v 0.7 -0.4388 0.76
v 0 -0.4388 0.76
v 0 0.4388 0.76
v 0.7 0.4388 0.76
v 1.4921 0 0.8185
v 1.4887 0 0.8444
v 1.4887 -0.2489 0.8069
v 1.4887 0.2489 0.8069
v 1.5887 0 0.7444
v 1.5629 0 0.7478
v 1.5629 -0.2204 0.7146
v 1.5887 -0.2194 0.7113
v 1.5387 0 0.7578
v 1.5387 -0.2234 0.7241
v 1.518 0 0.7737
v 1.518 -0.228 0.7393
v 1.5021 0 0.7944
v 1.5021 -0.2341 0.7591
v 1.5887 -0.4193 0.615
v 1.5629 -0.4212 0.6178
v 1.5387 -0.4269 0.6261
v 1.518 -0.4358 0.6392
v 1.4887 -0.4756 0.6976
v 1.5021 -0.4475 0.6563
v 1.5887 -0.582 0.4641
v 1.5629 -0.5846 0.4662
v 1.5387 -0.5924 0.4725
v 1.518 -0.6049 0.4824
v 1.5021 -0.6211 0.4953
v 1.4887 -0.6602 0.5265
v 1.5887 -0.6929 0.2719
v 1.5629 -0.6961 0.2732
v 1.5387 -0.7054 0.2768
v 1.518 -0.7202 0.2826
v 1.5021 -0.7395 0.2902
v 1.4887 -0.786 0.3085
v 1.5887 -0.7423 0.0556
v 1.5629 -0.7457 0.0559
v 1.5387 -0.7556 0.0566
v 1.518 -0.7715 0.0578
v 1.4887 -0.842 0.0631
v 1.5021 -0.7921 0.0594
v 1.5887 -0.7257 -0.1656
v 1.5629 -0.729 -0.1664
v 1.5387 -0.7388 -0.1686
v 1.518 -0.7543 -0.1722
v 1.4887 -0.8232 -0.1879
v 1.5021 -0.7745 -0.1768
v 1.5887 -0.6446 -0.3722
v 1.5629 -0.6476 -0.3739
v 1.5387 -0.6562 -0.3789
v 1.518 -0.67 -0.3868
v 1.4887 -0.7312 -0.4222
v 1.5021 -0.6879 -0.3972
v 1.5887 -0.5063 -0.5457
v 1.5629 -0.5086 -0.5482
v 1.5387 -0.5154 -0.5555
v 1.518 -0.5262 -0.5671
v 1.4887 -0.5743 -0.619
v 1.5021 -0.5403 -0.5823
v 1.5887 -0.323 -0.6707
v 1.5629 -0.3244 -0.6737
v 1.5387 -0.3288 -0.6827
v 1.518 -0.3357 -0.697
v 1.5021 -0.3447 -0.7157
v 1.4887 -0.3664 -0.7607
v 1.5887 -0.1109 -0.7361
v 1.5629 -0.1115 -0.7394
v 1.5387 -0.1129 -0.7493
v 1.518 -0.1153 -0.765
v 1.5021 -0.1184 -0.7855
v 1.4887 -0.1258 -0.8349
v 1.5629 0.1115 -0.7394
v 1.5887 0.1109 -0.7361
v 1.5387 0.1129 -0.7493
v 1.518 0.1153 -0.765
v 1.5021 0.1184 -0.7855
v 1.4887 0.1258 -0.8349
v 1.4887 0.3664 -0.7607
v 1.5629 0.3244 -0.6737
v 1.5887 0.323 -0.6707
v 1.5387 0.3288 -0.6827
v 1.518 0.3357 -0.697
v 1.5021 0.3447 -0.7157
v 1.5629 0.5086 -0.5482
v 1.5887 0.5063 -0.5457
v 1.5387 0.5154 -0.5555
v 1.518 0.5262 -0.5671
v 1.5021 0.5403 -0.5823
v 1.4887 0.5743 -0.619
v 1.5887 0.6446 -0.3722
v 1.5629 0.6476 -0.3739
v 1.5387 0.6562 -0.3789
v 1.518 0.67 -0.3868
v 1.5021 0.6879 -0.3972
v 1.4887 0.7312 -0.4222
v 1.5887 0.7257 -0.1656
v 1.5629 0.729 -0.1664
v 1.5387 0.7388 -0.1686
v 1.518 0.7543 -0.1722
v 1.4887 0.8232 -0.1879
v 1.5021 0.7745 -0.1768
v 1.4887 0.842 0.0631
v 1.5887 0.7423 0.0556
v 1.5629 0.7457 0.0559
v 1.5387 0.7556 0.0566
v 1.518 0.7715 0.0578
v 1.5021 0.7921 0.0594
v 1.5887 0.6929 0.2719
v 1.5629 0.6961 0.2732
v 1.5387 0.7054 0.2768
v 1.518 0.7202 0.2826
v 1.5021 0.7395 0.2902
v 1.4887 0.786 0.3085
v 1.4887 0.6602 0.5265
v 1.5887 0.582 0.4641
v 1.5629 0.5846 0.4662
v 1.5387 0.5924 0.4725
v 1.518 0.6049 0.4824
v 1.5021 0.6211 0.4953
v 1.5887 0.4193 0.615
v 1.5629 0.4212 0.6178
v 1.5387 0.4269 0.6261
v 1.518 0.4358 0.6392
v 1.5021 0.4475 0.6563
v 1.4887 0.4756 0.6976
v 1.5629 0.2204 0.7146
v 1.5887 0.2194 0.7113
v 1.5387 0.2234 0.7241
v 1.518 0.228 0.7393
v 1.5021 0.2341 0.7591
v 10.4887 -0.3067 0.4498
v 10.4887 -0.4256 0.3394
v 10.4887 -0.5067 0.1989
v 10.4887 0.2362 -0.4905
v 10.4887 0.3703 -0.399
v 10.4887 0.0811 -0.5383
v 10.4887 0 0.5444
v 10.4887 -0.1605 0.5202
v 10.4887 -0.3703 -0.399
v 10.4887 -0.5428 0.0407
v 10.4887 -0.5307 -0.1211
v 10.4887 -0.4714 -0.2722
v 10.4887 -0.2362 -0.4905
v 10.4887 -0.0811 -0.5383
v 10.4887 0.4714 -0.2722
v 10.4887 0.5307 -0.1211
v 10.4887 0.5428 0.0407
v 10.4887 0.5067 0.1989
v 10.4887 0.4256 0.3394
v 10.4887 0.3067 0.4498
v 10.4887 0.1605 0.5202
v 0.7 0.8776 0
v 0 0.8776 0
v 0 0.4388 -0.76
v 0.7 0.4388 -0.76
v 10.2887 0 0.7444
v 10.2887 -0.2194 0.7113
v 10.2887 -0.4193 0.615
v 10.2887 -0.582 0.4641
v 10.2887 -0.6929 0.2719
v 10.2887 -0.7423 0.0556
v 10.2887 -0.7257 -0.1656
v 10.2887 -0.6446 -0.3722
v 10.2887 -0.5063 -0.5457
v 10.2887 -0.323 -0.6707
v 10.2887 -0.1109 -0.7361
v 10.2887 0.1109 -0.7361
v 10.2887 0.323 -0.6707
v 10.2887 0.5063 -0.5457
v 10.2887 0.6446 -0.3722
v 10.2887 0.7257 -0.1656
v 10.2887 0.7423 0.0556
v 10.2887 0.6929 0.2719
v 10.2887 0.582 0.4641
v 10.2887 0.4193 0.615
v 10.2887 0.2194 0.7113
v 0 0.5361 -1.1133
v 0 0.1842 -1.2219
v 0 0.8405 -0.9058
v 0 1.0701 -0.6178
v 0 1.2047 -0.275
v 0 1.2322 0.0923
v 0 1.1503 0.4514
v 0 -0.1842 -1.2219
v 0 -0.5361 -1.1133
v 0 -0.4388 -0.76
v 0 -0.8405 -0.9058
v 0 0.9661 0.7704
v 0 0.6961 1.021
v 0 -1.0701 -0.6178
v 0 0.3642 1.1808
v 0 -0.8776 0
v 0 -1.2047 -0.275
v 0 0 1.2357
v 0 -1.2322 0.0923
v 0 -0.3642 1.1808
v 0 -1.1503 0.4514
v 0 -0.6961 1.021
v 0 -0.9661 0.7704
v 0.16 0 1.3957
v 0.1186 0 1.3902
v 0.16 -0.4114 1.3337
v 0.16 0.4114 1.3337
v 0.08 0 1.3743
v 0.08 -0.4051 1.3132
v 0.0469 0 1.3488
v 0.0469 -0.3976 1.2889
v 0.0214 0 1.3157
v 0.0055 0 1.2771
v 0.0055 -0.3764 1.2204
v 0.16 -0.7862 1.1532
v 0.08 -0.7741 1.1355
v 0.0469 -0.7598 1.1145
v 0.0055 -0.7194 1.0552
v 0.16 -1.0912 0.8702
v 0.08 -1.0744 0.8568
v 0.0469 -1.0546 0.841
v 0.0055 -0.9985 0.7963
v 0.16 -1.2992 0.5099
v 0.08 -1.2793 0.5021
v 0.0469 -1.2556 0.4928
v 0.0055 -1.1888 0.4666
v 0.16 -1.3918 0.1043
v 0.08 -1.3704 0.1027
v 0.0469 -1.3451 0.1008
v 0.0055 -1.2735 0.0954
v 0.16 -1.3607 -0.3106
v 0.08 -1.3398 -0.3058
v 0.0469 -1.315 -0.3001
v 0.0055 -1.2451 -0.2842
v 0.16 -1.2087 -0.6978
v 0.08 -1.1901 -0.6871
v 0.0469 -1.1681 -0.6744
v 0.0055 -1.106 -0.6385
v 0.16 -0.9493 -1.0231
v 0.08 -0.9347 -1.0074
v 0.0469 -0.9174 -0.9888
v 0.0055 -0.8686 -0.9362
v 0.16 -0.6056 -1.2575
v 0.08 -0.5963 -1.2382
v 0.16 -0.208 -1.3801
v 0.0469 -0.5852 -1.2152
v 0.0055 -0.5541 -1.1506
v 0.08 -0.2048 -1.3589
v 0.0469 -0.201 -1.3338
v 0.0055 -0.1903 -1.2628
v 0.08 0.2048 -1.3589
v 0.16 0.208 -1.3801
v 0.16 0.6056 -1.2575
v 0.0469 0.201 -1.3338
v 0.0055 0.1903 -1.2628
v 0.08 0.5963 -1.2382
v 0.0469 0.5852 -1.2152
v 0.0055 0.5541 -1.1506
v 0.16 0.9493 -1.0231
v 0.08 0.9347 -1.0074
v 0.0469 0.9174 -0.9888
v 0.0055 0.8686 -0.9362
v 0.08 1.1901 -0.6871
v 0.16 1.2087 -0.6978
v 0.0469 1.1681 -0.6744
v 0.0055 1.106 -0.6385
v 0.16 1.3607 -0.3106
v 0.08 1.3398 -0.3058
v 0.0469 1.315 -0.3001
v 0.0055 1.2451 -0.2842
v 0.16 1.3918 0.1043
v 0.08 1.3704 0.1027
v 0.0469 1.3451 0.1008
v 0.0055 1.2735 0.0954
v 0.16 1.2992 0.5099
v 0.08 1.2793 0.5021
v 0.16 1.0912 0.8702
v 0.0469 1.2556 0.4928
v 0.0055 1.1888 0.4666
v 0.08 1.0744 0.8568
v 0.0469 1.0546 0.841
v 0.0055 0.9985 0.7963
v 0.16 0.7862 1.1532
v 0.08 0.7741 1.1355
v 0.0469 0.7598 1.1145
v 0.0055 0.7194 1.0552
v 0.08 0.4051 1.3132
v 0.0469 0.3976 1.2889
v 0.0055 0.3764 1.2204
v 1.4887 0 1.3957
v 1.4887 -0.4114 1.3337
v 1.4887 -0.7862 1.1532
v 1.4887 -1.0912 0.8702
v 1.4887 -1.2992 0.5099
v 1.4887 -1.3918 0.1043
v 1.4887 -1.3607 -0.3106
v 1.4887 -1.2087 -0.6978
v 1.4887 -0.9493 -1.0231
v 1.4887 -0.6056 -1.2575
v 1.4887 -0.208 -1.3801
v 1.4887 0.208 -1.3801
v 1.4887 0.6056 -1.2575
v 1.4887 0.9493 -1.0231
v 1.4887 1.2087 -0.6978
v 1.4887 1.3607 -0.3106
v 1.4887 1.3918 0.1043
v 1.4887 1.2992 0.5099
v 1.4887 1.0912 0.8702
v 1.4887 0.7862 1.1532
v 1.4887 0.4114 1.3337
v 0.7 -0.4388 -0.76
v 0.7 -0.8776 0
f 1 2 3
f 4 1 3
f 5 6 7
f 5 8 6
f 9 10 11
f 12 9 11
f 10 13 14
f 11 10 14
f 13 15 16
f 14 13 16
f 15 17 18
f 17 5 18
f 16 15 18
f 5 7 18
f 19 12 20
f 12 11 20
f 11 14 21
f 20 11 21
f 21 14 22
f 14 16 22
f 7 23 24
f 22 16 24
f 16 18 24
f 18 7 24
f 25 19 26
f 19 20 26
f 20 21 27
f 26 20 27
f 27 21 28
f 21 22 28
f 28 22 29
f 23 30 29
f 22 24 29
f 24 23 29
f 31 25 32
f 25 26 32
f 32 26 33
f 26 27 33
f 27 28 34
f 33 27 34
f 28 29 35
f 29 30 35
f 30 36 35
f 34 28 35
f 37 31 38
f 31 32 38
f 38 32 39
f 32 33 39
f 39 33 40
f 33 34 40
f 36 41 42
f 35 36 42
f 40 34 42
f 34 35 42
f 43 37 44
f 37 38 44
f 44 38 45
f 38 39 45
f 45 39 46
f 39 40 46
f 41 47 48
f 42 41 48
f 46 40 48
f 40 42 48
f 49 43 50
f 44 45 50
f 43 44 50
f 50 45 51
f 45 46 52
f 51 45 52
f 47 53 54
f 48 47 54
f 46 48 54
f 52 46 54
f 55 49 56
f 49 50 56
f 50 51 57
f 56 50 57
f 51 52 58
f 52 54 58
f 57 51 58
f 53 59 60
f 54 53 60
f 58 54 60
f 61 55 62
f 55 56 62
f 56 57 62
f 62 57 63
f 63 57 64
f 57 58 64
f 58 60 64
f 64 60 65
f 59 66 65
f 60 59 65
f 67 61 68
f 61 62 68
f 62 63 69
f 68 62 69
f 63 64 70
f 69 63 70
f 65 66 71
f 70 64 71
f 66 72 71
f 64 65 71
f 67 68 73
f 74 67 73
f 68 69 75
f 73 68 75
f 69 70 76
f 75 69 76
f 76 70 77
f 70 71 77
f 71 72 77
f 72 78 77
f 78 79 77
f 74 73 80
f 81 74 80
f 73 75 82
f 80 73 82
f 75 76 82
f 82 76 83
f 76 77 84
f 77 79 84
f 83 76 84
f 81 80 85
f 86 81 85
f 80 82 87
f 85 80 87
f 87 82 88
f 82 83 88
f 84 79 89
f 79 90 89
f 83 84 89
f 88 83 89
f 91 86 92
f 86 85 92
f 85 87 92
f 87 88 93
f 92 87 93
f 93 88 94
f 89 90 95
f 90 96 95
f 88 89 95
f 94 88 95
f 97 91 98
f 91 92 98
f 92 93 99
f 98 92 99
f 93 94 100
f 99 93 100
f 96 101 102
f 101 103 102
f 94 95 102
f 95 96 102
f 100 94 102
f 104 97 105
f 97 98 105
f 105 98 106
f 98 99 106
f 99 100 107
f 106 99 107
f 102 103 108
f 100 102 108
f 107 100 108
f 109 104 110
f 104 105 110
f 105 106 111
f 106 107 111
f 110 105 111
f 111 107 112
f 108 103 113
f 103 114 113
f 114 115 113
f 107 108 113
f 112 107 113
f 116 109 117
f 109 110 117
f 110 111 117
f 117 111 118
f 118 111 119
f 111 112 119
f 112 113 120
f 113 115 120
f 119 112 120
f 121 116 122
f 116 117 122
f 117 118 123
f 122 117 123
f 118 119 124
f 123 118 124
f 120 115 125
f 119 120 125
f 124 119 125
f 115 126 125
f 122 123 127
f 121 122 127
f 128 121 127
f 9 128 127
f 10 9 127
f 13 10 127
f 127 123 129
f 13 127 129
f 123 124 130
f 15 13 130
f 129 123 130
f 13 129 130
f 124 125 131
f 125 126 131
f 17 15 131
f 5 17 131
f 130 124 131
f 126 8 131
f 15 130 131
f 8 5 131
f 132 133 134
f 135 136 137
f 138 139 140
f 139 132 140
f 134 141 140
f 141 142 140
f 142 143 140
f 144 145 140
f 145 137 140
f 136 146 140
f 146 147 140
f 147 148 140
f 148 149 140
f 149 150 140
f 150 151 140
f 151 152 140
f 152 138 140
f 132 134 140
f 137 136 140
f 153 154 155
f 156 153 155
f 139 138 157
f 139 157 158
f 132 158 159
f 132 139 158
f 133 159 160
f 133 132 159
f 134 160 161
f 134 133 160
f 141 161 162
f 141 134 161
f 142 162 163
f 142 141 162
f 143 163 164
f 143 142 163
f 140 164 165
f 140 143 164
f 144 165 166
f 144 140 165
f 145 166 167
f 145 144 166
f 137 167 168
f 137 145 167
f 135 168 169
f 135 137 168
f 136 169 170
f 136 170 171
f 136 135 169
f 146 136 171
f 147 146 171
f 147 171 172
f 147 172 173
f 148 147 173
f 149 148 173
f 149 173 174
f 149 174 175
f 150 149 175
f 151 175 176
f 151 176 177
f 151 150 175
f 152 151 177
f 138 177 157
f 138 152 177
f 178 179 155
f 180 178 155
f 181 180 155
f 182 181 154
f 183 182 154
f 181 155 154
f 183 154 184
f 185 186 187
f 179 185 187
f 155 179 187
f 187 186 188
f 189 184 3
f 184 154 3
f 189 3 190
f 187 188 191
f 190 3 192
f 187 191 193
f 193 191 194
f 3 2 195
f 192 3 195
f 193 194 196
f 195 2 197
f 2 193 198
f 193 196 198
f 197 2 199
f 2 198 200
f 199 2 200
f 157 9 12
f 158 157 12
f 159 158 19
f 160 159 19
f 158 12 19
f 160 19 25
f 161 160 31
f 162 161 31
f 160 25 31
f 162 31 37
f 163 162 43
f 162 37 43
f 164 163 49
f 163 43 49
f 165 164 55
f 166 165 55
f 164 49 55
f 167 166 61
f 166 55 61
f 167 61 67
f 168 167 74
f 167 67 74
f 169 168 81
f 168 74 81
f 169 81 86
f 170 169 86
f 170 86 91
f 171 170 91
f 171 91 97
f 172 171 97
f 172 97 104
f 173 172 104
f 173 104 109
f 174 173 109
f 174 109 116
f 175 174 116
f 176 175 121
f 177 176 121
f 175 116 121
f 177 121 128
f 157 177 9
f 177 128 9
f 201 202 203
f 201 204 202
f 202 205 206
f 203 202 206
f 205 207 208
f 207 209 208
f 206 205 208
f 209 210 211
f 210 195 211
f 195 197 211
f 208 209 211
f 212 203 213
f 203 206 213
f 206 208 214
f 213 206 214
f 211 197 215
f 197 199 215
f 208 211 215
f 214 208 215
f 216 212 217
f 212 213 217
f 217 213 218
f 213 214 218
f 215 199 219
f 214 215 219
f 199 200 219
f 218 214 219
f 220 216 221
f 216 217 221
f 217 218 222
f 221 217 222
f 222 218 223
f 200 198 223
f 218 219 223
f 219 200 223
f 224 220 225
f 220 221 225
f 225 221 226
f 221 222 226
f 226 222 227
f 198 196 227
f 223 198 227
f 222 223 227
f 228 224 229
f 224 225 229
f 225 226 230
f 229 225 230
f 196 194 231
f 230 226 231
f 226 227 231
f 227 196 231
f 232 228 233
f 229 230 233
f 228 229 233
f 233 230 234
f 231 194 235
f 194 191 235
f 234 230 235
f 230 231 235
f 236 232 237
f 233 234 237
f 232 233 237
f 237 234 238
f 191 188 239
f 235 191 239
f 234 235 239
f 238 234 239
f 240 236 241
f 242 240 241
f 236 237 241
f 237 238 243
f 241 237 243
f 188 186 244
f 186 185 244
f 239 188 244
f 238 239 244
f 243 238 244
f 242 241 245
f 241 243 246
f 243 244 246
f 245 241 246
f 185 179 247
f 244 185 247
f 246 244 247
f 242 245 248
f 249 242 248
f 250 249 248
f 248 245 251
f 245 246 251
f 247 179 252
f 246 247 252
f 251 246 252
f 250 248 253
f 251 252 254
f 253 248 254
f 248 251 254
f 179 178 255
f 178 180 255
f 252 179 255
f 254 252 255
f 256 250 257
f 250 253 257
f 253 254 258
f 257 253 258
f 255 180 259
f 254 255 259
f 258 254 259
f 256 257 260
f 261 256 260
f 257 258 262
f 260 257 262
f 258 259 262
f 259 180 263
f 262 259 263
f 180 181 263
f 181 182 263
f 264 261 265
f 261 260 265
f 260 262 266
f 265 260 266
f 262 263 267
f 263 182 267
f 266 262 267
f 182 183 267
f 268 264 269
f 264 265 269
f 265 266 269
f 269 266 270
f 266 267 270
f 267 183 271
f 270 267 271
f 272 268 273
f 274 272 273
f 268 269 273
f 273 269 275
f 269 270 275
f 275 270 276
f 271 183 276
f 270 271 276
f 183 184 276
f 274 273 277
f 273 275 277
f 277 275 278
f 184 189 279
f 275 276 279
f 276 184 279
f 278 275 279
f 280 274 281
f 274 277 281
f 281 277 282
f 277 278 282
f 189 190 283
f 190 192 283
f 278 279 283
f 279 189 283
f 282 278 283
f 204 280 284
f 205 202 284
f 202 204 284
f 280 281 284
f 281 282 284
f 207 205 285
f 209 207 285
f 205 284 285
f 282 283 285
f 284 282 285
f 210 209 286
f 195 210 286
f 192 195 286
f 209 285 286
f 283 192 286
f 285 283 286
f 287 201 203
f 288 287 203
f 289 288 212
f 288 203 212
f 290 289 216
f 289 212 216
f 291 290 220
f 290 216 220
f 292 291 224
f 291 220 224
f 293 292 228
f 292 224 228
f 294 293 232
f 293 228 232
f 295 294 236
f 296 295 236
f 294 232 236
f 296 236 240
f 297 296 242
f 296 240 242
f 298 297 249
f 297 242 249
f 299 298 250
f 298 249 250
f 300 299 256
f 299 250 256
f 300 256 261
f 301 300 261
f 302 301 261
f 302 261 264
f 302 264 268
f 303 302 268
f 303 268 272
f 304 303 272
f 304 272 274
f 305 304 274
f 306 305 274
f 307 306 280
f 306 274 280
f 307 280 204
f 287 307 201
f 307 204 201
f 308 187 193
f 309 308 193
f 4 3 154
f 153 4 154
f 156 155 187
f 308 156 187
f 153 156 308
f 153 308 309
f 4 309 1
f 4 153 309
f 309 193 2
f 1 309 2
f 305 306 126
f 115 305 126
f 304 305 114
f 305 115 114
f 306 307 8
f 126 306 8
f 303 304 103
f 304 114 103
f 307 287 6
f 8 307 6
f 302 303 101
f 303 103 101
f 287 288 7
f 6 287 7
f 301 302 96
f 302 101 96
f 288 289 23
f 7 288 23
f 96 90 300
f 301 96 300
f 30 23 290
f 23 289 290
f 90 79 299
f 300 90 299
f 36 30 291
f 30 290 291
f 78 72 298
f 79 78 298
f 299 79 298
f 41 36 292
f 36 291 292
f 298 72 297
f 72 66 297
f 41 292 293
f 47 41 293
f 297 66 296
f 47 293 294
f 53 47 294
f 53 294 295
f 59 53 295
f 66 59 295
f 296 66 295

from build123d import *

# Parameters (mm, degrees)
FILLET1_R      = 0.1
FILLET2_R      = 0.16
CHAMFER1_SIZE  = 0.2
EXTRUDE1_DEPTH = 0.7


with BuildPart() as part:
    # Sketch1 → Revolve1 (revolve)
    with BuildSketch(Plane.XY, mode=Mode.PRIVATE) as revolve1_sk:
        Polygon((0, 1.395688245), (0, 0), (10.488734128, 0), (10.488734128, 0.744367064), (1.488734128, 0.744367064), (1.488734128, 1.395688245), align=None)
    revolve(revolve1_sk.sketch.rotate(Axis((0, 0, 0), (1, 0, 0)), 90), axis=Axis((0, 0, 0), (1, 0, 0)))

    # Fillet1
    fillet1_edges = [part.edges().sort_by_distance(p)[0] for p in [
        (1.488734128, 0, -0.744367064),
    ]]
    fillet(fillet1_edges, radius=FILLET1_R)

    # Fillet2
    fillet2_edges = [part.edges().sort_by_distance(p)[0] for p in [
        (0, 0, -1.395688245),
    ]]
    fillet(fillet2_edges, radius=FILLET2_R)

    # Chamfer1
    chamfer1_edges = [part.edges().sort_by_distance(p)[0] for p in [
        (10.488734128, 0, -0.744367064),
    ]]
    chamfer(chamfer1_edges, length=CHAMFER1_SIZE)

    # Sketch2 → Extrude1 (cut)
    with BuildSketch(Plane.ZY):
        Polygon((0, 0.877572409), (-0.76, 0.438786205), (-0.76, -0.438786205), (0, -0.877572409), (0.76, -0.438786205), (0.76, 0.438786205), align=None)
    extrude(amount=-EXTRUDE1_DEPTH, mode=Mode.SUBTRACT)


solid = part.part
